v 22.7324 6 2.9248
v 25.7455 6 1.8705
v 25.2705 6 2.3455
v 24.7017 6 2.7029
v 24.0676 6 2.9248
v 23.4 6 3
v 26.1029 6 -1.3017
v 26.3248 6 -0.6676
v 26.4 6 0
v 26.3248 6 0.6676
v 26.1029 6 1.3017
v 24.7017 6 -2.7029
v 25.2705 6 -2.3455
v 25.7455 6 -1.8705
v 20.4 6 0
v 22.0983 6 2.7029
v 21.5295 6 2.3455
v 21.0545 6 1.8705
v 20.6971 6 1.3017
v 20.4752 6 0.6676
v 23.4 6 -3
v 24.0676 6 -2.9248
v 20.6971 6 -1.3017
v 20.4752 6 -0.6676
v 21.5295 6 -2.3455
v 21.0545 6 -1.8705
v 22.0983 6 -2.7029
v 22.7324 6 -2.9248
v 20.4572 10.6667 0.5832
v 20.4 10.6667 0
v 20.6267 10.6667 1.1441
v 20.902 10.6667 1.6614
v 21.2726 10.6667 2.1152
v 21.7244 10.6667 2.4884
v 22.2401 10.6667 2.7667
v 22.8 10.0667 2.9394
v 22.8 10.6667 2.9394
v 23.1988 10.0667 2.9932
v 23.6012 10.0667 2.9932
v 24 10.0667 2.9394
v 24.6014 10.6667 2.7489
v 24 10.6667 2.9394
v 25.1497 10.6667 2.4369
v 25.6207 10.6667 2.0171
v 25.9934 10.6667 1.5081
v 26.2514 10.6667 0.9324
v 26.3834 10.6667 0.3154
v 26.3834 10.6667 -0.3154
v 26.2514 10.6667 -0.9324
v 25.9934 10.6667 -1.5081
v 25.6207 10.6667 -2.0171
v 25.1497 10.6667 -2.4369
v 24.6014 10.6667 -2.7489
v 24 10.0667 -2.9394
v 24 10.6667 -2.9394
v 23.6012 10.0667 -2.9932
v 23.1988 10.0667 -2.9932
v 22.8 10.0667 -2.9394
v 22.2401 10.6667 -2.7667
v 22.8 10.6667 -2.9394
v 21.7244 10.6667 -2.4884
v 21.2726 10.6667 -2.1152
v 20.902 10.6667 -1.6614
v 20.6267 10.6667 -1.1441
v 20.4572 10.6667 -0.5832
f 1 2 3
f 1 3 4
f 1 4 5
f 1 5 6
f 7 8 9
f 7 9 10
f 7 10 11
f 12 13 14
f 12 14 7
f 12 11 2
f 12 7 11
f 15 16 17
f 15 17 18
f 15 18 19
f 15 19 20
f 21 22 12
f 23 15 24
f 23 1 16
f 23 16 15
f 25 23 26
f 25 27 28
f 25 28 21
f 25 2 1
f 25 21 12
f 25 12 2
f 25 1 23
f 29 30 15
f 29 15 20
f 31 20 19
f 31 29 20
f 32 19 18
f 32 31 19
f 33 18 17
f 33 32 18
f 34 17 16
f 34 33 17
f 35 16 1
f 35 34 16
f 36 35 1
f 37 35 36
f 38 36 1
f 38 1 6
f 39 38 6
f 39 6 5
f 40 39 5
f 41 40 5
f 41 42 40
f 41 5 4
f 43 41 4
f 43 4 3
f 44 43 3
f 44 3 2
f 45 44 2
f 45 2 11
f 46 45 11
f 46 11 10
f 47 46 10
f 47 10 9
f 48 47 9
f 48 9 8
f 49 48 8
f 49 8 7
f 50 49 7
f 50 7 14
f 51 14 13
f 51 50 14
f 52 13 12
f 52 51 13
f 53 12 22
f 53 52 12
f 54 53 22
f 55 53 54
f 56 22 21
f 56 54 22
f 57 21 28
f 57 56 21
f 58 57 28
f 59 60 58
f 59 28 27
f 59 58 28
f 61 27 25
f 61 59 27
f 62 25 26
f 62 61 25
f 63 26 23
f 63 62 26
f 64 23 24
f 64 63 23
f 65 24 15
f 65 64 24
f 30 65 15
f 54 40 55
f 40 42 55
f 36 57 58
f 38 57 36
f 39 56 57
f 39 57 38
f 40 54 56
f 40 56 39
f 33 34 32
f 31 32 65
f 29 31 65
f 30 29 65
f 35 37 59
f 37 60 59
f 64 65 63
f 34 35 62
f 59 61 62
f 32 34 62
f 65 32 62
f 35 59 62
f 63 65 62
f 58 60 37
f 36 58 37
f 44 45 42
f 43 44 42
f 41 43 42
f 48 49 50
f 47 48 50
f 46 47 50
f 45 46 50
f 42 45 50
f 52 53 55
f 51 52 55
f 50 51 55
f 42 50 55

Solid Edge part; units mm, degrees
sketch "Sketch1" plane through (0, 0, 0) normal (0, 0, 1) x (1, 0, 0)
  line L0 (23.4, 6) -> (20.4, 6)
  line L1 (20.4, 6) -> (20.4, 10.6667)
  line L2 (20.4, 10.6667) -> (23.4, 10.6667)
  line L3 (23.4, 10.6667) -> (23.4, 6)
revolve "RevolvedProtrusion1" add sketch "Sketch1" angle 360 about axis through (23.4, 10.6667, 0) along (0, -1, 0)
cosmetic_thread "Thread1" size "M6"
sketch "Sketch2" plane through (23.4, 10.6667, 0) normal (0, 1, 0) x (-1, 0, 0)
  line L0 (-0.6, 11.985) -> (-0.6, -11.985)
  arc A0 (-0.6, -11.985) -> (0.6, -11.985) centre (0, 0) ccw
  line L1 (0.6, -11.985) -> (0.6, 11.985)
  arc A1 (0.6, 11.985) -> (-0.6, 11.985) centre (0, 0) ccw
extrude "Cutout1" cut sketch "Sketch2" against normal blind 0.6
properties part number "UCP201 GB/T7810-1995_PART6"
